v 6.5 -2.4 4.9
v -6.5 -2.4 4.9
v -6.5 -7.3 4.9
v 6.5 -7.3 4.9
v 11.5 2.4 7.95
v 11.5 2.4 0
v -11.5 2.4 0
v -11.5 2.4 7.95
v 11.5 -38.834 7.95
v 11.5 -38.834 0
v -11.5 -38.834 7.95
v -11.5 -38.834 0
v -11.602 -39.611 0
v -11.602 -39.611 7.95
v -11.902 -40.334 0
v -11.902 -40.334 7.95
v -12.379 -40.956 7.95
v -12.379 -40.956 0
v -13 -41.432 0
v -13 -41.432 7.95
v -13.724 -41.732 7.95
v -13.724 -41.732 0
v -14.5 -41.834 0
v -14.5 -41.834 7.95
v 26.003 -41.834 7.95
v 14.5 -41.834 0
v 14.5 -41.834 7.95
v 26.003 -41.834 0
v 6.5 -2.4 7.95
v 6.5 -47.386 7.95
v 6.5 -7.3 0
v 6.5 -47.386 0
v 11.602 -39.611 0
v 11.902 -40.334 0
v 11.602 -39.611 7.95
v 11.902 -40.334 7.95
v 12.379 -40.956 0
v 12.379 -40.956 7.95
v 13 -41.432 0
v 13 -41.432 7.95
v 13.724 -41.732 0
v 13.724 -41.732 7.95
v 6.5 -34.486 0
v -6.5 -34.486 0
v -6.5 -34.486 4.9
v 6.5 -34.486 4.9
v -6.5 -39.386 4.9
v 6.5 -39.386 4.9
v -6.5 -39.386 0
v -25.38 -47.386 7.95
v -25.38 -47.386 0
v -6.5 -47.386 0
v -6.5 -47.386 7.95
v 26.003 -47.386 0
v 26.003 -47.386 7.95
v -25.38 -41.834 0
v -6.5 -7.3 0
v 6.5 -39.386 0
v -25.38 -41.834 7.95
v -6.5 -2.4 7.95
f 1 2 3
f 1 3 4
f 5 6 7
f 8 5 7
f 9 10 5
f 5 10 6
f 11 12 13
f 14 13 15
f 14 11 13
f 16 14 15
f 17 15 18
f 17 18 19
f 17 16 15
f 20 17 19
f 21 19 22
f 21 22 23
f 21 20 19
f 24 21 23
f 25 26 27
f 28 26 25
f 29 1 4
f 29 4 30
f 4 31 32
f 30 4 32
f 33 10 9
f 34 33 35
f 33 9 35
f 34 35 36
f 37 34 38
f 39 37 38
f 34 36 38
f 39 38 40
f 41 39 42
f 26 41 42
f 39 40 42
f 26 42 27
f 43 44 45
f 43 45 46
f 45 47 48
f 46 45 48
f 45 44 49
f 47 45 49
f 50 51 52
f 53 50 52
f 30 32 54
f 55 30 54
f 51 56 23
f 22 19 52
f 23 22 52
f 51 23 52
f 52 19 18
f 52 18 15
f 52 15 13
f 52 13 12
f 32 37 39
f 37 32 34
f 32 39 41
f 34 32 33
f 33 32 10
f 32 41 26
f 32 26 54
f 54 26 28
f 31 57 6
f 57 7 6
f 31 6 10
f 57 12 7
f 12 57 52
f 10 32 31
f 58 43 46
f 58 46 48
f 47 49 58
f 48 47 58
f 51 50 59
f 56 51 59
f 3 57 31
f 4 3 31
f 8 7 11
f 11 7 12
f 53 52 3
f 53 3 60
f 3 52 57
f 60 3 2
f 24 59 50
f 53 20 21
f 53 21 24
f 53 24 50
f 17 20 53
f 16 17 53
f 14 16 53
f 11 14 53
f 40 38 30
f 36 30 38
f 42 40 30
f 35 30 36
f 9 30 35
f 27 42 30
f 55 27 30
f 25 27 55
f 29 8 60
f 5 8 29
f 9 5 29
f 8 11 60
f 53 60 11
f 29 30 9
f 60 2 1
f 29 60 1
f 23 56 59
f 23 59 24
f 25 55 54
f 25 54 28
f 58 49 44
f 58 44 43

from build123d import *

# Parameters (mm, degrees)
F0_W     = 14.5028467007
F0_H     = 5.5518312344
F0_W_2   = 13.879578086
F1_DEPTH = 7.95
F2_W     = 13
F2_H     = 4.9
F3_DEPTH = 4.9
F4_W     = 13
F4_H     = 4.9
F5_DEPTH = 4.9
F6_R     = 3
F7_R     = 3


with BuildPart() as f1:
    # F0 (on Top) → F1 (new body)
    with BuildSketch(Plane.XY):
        Polygon((11.5, -2.4), (11.5, 2.4), (-11.5, 2.4), (-11.5, -2.4), (-6.5, -2.4), (6.5, -2.4), align=None)
        Polygon((11.5, -41.8343176826), (11.5, -2.4), (6.5, -2.4), (6.5, -47.386148917), (11.5, -47.386148917), align=None)
        Polygon((-6.5, -2.4), (-11.5, -2.4), (-11.5, -41.8343176826), (-11.5, -47.386148917), (-6.5, -47.386148917), align=None)
        with Locations((18.7514233503, -44.6102332998)):
            Rectangle(F0_W, F0_H)
        with Locations((-18.439789043, -44.6102332998)):
            Rectangle(F0_W_2, F0_H)
    extrude(amount=F1_DEPTH)

    # F4 (on Top) → F5 (join)
    with BuildSketch(Plane.XY):
        with Locations((0, -4.85)):
            Rectangle(F4_W, F4_H)
    extrude(amount=F5_DEPTH)

    # F6
    f6_edges = [f1.edges().sort_by_distance(p)[0] for p in [
        (-11.5, -41.834318, 3.975),
    ]]
    fillet(f6_edges, radius=F6_R)

    # F7
    f7_edges = [f1.edges().sort_by_distance(p)[0] for p in [
        (11.5, -41.834318, 3.975),
    ]]
    fillet(f7_edges, radius=F7_R)


with BuildPart() as f3:
    # F2 (on face) → F3 (new body)
    with BuildSketch(Plane(origin=(0, 0, 0), x_dir=(1, 0, 0), z_dir=(0, 0, -1))):
        with Locations((0, 36.936148917)):
            Rectangle(F2_W, F2_H)
    extrude(amount=-F3_DEPTH)


solid = Compound([f1.part, f3.part])
